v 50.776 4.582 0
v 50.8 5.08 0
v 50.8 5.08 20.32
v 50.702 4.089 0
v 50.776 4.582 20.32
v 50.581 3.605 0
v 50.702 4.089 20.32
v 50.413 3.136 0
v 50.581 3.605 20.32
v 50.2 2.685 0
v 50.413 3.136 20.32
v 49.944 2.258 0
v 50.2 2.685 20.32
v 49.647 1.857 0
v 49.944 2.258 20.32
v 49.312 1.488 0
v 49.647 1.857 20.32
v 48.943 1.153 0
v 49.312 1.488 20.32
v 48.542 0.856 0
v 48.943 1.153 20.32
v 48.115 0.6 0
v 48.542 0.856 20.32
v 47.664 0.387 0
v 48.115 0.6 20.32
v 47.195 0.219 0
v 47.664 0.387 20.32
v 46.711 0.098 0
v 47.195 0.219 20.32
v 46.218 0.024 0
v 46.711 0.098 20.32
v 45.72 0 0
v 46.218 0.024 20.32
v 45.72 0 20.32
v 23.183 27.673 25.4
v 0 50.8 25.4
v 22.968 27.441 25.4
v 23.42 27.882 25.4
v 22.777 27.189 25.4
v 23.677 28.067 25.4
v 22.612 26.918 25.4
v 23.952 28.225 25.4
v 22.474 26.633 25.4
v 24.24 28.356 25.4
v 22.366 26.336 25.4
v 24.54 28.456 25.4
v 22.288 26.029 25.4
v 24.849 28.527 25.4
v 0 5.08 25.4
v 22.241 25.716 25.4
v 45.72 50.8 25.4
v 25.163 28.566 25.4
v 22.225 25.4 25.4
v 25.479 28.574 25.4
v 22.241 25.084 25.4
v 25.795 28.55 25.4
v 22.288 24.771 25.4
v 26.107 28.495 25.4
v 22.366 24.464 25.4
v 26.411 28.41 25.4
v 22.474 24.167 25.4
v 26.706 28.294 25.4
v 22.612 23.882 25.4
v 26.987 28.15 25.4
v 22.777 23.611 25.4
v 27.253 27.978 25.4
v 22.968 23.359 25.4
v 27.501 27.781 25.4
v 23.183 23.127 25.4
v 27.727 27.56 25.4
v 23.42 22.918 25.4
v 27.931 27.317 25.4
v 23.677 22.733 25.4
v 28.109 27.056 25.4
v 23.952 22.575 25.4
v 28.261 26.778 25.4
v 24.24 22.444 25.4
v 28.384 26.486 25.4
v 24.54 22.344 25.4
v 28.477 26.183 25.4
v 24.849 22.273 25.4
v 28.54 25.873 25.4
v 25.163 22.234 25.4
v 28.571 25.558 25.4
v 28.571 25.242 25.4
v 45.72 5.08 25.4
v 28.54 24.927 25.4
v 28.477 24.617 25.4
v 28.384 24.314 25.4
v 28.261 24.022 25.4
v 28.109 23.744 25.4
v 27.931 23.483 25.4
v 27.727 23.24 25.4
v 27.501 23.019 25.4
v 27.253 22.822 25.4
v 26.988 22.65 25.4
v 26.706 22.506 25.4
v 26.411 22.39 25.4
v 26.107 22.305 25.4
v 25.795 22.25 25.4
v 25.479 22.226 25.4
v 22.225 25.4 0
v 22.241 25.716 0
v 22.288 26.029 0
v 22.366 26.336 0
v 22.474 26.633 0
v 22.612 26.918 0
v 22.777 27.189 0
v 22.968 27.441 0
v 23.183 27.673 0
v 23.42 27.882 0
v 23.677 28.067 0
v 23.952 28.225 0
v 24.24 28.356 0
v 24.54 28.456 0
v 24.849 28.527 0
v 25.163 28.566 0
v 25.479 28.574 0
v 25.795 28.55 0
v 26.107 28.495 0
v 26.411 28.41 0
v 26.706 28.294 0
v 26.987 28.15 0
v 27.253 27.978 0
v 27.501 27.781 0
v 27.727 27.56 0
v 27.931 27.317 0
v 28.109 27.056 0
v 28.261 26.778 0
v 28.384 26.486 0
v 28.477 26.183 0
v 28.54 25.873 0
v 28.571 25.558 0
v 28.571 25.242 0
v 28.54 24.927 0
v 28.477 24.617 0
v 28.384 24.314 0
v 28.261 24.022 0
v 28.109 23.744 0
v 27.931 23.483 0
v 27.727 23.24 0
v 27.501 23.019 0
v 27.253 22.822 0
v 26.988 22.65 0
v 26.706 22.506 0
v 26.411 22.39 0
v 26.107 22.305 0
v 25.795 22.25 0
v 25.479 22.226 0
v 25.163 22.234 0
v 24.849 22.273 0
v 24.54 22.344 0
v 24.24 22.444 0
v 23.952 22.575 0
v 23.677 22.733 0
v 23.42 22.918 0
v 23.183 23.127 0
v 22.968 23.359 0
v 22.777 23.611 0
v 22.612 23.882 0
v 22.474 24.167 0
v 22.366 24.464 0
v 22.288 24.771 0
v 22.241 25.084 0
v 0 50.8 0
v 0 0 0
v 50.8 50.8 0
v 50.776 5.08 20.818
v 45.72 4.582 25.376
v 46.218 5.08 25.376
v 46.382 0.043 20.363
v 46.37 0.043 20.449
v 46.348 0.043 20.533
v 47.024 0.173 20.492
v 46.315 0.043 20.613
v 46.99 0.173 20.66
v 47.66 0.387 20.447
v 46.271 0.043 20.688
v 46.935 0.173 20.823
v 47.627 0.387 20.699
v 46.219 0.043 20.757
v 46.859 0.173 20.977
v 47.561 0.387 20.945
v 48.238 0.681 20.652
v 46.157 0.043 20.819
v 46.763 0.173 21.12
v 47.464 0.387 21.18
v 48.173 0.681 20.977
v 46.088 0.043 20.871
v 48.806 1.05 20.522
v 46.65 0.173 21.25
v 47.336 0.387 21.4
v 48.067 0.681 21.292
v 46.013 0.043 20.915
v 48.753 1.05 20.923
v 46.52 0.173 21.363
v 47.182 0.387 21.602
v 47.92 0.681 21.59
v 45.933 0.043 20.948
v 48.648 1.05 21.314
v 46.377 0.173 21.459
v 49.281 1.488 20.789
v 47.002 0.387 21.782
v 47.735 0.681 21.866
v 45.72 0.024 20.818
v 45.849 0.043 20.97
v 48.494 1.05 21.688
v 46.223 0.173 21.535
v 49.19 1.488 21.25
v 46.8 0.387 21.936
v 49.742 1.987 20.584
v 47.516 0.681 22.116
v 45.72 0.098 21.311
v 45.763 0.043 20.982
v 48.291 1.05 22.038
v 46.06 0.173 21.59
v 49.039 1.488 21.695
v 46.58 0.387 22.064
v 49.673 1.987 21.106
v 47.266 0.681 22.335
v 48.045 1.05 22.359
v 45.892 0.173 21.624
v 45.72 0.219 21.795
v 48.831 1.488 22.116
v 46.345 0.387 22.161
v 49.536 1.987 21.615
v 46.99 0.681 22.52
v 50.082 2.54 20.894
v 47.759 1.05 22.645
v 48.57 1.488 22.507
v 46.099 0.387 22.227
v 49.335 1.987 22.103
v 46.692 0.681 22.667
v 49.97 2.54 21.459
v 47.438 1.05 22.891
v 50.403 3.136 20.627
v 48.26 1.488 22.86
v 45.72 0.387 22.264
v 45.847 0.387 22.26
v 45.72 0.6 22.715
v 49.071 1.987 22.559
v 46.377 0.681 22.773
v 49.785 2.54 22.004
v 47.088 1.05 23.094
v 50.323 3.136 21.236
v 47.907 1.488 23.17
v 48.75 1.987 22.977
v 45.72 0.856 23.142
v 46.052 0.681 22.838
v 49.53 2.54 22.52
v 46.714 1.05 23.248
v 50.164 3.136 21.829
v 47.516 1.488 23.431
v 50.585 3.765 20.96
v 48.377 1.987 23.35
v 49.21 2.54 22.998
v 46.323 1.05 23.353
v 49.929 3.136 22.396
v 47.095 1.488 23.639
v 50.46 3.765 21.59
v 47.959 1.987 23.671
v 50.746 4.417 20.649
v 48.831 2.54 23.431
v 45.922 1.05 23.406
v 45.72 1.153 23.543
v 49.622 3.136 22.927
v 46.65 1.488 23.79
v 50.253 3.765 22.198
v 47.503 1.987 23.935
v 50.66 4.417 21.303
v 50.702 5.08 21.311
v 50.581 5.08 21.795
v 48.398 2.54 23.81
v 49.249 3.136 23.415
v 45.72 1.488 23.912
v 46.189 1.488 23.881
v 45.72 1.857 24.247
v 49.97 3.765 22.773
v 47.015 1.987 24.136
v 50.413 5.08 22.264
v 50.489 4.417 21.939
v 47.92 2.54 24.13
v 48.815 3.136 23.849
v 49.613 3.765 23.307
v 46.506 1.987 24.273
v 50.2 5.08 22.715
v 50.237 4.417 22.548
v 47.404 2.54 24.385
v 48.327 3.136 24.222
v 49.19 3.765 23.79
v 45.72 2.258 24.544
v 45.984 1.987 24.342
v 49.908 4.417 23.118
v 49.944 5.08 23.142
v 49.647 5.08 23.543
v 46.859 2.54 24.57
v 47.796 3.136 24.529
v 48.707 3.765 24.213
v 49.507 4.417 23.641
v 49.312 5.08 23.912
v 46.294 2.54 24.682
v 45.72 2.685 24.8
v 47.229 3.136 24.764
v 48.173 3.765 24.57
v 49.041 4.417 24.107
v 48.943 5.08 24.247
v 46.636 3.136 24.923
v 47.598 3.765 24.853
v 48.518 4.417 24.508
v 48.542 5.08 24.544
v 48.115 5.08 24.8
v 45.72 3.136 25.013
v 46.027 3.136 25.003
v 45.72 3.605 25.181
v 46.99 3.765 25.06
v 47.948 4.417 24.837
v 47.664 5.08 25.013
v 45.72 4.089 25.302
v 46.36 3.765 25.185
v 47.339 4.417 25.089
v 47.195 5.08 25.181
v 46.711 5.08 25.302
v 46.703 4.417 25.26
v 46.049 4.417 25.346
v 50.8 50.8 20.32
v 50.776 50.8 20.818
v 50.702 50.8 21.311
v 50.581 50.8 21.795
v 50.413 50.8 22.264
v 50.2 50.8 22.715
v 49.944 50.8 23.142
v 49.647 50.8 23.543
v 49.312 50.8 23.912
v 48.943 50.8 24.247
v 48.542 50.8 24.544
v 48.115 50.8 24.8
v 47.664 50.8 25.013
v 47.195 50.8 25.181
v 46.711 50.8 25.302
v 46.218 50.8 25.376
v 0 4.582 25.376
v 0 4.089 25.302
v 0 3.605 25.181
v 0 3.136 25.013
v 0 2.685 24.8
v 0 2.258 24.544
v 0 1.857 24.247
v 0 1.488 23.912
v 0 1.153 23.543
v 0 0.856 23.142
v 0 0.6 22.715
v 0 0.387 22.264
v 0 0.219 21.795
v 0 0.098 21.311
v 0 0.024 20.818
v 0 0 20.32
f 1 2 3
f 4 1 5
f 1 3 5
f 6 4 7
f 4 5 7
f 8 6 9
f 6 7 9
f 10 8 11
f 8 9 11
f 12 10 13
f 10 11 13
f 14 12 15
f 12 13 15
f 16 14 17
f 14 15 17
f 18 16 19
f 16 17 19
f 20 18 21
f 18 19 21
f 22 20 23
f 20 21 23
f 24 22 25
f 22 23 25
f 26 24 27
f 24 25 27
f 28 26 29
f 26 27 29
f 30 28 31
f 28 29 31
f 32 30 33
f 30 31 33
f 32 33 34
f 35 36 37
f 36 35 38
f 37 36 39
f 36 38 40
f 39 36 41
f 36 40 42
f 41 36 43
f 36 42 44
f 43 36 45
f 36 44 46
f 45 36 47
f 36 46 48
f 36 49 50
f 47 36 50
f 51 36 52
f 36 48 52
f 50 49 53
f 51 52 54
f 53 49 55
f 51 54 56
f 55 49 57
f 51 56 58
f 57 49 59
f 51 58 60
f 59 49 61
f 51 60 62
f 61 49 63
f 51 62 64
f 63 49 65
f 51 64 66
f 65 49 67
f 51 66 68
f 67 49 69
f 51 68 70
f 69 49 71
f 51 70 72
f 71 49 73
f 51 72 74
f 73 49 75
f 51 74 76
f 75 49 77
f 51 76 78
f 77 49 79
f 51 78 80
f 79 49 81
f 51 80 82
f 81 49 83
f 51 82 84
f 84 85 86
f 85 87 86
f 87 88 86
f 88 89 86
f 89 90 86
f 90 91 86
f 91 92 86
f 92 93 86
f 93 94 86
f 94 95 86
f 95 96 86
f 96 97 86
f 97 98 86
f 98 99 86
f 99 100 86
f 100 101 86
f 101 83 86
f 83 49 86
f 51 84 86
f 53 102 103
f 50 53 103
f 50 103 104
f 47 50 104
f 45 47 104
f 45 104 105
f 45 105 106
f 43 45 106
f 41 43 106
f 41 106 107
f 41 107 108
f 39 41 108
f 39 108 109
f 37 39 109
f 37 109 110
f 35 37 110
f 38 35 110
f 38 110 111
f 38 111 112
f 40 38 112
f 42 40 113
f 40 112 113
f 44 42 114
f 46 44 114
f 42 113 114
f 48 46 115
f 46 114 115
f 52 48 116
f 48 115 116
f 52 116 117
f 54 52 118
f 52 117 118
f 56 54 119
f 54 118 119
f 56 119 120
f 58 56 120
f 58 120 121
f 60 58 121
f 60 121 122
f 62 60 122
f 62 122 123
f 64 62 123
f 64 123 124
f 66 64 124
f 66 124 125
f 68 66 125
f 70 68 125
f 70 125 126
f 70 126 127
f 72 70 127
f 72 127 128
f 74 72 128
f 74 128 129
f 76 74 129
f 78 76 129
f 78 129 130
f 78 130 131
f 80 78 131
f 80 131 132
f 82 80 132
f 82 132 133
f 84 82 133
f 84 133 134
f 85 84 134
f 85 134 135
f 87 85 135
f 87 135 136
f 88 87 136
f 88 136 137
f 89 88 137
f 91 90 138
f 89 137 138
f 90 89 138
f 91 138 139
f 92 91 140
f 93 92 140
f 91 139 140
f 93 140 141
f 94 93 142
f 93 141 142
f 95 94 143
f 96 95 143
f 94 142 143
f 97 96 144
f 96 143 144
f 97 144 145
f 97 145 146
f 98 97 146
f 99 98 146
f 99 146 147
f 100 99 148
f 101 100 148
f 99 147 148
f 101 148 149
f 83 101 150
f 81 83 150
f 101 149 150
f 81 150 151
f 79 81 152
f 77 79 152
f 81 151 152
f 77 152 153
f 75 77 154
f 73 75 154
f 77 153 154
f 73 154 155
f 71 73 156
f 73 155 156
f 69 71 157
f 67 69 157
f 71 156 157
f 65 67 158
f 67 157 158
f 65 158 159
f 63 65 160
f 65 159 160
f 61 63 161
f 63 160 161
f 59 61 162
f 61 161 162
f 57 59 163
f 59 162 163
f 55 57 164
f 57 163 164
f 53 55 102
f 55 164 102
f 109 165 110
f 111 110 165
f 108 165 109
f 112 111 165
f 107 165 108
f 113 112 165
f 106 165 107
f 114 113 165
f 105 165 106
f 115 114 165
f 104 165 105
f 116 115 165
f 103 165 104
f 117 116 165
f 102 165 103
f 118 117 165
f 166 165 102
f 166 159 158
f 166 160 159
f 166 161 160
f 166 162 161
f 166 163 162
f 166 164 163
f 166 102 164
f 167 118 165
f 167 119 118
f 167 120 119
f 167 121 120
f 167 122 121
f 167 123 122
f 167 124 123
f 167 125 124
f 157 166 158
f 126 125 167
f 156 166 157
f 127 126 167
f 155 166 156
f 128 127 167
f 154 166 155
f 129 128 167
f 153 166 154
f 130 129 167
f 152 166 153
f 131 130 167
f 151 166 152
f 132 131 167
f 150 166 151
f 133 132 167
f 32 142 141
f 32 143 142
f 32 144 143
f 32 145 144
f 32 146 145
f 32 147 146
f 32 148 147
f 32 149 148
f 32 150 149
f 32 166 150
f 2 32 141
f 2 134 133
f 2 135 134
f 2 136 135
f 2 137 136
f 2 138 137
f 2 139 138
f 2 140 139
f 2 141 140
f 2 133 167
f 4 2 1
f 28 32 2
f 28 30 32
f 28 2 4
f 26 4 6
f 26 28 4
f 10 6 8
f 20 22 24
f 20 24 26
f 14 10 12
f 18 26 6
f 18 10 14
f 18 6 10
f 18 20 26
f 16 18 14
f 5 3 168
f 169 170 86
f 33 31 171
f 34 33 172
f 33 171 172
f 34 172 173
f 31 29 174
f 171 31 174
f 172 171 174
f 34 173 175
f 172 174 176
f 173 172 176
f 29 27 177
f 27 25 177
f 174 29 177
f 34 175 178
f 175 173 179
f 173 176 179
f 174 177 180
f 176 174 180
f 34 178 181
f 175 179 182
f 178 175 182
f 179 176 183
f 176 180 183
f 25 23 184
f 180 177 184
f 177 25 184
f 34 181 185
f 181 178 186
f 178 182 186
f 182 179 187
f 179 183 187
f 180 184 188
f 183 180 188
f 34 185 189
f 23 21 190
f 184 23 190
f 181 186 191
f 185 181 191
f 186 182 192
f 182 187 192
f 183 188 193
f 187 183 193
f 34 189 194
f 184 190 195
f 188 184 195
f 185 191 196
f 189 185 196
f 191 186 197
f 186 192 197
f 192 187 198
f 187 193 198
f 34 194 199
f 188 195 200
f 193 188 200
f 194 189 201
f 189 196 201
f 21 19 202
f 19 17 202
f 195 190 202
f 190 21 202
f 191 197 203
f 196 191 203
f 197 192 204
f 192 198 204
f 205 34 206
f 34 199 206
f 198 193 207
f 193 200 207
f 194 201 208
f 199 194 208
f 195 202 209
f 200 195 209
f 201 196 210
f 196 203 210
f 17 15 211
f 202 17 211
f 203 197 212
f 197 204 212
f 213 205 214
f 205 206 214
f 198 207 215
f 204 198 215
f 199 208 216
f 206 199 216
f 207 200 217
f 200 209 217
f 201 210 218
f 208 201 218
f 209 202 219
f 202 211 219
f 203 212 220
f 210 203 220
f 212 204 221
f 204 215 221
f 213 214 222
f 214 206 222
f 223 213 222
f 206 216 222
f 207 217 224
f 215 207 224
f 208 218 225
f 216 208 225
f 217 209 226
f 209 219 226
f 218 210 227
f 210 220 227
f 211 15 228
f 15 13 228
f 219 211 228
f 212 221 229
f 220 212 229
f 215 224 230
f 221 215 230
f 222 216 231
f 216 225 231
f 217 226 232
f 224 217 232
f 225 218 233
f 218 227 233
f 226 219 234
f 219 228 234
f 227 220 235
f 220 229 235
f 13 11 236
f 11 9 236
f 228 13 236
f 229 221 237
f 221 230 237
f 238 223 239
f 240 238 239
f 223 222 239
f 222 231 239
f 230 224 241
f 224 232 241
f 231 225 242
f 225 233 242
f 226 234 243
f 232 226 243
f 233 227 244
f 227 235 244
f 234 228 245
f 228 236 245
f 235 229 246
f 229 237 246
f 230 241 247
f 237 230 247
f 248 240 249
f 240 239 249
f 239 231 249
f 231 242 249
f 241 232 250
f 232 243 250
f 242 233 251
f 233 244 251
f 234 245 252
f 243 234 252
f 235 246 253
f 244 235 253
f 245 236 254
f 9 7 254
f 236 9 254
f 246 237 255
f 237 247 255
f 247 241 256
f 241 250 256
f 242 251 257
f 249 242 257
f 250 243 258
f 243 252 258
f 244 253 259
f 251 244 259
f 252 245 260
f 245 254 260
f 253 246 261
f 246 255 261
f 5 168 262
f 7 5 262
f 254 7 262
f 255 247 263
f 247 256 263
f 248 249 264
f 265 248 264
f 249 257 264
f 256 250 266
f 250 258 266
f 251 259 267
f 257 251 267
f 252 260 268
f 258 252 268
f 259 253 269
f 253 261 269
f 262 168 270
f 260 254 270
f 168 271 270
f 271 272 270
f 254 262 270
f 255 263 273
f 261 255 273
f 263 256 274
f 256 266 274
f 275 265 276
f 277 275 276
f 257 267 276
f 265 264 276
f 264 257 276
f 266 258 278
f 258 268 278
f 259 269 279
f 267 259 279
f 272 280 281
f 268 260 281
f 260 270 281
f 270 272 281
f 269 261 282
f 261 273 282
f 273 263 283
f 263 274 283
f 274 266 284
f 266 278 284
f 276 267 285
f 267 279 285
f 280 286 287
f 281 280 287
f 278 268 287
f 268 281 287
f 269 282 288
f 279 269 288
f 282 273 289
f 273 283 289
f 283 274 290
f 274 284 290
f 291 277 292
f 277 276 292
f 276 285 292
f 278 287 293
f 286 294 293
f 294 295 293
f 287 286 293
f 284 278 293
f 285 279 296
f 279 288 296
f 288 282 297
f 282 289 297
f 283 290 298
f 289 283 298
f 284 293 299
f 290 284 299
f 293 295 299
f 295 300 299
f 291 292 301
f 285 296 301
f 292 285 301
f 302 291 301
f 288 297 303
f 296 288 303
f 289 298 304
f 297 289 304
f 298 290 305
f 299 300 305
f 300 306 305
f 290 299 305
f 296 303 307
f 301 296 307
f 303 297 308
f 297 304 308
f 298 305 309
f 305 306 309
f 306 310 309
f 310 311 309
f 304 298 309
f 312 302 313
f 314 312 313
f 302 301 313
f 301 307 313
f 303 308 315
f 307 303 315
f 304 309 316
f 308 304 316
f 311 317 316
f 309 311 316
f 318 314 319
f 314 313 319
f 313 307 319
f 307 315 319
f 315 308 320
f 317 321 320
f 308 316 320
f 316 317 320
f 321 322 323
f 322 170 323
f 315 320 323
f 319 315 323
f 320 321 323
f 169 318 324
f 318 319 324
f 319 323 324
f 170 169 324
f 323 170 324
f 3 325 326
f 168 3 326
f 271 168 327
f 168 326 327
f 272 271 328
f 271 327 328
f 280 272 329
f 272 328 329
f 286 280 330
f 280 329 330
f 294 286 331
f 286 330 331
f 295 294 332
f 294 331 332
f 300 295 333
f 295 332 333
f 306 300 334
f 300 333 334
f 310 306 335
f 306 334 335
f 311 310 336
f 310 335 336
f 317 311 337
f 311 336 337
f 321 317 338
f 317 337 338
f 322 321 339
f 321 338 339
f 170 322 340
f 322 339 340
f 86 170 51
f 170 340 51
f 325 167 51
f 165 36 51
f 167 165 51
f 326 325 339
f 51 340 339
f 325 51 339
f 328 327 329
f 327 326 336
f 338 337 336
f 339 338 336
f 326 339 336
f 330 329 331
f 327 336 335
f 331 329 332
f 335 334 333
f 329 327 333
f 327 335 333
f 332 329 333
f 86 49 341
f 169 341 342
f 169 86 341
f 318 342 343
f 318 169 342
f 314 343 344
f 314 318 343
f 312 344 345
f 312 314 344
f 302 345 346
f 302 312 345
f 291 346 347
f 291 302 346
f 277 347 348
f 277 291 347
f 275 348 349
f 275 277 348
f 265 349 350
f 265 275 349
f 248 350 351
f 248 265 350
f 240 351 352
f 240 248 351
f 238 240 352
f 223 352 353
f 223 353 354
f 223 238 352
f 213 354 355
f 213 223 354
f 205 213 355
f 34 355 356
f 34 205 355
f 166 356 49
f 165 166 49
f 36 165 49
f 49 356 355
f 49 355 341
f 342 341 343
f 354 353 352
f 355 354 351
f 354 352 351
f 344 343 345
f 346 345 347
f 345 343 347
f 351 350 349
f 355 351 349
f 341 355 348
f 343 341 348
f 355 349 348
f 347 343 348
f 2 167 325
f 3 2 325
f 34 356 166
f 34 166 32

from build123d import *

# Parameters (mm, degrees)
F0_W     = 50.8
F0_H     = 25.4
F1_DEPTH = 50.8
F2_R     = 5.08
F4_D     = 6.35


with BuildPart() as f1:
    # F0 (on Front) → F1 (new body)
    with BuildSketch(Plane.XZ):
        with Locations((25.4, 12.7)):
            Rectangle(F0_W, F0_H)
    extrude(amount=-F1_DEPTH)

    # F2
    f2_edges = [f1.edges().sort_by_distance(p)[0] for p in [
        (50.8, 25.4, 25.4),
        (50.8, 0, 12.7),
        (25.4, 0, 25.4),
    ]]
    fillet(f2_edges, radius=F2_R)

    # F4 (through all)
    with Locations(Plane.XY.offset(25.4)):
        with Locations((25.4, 25.4)):
            Hole(F4_D / 2)


solid = f1.part
